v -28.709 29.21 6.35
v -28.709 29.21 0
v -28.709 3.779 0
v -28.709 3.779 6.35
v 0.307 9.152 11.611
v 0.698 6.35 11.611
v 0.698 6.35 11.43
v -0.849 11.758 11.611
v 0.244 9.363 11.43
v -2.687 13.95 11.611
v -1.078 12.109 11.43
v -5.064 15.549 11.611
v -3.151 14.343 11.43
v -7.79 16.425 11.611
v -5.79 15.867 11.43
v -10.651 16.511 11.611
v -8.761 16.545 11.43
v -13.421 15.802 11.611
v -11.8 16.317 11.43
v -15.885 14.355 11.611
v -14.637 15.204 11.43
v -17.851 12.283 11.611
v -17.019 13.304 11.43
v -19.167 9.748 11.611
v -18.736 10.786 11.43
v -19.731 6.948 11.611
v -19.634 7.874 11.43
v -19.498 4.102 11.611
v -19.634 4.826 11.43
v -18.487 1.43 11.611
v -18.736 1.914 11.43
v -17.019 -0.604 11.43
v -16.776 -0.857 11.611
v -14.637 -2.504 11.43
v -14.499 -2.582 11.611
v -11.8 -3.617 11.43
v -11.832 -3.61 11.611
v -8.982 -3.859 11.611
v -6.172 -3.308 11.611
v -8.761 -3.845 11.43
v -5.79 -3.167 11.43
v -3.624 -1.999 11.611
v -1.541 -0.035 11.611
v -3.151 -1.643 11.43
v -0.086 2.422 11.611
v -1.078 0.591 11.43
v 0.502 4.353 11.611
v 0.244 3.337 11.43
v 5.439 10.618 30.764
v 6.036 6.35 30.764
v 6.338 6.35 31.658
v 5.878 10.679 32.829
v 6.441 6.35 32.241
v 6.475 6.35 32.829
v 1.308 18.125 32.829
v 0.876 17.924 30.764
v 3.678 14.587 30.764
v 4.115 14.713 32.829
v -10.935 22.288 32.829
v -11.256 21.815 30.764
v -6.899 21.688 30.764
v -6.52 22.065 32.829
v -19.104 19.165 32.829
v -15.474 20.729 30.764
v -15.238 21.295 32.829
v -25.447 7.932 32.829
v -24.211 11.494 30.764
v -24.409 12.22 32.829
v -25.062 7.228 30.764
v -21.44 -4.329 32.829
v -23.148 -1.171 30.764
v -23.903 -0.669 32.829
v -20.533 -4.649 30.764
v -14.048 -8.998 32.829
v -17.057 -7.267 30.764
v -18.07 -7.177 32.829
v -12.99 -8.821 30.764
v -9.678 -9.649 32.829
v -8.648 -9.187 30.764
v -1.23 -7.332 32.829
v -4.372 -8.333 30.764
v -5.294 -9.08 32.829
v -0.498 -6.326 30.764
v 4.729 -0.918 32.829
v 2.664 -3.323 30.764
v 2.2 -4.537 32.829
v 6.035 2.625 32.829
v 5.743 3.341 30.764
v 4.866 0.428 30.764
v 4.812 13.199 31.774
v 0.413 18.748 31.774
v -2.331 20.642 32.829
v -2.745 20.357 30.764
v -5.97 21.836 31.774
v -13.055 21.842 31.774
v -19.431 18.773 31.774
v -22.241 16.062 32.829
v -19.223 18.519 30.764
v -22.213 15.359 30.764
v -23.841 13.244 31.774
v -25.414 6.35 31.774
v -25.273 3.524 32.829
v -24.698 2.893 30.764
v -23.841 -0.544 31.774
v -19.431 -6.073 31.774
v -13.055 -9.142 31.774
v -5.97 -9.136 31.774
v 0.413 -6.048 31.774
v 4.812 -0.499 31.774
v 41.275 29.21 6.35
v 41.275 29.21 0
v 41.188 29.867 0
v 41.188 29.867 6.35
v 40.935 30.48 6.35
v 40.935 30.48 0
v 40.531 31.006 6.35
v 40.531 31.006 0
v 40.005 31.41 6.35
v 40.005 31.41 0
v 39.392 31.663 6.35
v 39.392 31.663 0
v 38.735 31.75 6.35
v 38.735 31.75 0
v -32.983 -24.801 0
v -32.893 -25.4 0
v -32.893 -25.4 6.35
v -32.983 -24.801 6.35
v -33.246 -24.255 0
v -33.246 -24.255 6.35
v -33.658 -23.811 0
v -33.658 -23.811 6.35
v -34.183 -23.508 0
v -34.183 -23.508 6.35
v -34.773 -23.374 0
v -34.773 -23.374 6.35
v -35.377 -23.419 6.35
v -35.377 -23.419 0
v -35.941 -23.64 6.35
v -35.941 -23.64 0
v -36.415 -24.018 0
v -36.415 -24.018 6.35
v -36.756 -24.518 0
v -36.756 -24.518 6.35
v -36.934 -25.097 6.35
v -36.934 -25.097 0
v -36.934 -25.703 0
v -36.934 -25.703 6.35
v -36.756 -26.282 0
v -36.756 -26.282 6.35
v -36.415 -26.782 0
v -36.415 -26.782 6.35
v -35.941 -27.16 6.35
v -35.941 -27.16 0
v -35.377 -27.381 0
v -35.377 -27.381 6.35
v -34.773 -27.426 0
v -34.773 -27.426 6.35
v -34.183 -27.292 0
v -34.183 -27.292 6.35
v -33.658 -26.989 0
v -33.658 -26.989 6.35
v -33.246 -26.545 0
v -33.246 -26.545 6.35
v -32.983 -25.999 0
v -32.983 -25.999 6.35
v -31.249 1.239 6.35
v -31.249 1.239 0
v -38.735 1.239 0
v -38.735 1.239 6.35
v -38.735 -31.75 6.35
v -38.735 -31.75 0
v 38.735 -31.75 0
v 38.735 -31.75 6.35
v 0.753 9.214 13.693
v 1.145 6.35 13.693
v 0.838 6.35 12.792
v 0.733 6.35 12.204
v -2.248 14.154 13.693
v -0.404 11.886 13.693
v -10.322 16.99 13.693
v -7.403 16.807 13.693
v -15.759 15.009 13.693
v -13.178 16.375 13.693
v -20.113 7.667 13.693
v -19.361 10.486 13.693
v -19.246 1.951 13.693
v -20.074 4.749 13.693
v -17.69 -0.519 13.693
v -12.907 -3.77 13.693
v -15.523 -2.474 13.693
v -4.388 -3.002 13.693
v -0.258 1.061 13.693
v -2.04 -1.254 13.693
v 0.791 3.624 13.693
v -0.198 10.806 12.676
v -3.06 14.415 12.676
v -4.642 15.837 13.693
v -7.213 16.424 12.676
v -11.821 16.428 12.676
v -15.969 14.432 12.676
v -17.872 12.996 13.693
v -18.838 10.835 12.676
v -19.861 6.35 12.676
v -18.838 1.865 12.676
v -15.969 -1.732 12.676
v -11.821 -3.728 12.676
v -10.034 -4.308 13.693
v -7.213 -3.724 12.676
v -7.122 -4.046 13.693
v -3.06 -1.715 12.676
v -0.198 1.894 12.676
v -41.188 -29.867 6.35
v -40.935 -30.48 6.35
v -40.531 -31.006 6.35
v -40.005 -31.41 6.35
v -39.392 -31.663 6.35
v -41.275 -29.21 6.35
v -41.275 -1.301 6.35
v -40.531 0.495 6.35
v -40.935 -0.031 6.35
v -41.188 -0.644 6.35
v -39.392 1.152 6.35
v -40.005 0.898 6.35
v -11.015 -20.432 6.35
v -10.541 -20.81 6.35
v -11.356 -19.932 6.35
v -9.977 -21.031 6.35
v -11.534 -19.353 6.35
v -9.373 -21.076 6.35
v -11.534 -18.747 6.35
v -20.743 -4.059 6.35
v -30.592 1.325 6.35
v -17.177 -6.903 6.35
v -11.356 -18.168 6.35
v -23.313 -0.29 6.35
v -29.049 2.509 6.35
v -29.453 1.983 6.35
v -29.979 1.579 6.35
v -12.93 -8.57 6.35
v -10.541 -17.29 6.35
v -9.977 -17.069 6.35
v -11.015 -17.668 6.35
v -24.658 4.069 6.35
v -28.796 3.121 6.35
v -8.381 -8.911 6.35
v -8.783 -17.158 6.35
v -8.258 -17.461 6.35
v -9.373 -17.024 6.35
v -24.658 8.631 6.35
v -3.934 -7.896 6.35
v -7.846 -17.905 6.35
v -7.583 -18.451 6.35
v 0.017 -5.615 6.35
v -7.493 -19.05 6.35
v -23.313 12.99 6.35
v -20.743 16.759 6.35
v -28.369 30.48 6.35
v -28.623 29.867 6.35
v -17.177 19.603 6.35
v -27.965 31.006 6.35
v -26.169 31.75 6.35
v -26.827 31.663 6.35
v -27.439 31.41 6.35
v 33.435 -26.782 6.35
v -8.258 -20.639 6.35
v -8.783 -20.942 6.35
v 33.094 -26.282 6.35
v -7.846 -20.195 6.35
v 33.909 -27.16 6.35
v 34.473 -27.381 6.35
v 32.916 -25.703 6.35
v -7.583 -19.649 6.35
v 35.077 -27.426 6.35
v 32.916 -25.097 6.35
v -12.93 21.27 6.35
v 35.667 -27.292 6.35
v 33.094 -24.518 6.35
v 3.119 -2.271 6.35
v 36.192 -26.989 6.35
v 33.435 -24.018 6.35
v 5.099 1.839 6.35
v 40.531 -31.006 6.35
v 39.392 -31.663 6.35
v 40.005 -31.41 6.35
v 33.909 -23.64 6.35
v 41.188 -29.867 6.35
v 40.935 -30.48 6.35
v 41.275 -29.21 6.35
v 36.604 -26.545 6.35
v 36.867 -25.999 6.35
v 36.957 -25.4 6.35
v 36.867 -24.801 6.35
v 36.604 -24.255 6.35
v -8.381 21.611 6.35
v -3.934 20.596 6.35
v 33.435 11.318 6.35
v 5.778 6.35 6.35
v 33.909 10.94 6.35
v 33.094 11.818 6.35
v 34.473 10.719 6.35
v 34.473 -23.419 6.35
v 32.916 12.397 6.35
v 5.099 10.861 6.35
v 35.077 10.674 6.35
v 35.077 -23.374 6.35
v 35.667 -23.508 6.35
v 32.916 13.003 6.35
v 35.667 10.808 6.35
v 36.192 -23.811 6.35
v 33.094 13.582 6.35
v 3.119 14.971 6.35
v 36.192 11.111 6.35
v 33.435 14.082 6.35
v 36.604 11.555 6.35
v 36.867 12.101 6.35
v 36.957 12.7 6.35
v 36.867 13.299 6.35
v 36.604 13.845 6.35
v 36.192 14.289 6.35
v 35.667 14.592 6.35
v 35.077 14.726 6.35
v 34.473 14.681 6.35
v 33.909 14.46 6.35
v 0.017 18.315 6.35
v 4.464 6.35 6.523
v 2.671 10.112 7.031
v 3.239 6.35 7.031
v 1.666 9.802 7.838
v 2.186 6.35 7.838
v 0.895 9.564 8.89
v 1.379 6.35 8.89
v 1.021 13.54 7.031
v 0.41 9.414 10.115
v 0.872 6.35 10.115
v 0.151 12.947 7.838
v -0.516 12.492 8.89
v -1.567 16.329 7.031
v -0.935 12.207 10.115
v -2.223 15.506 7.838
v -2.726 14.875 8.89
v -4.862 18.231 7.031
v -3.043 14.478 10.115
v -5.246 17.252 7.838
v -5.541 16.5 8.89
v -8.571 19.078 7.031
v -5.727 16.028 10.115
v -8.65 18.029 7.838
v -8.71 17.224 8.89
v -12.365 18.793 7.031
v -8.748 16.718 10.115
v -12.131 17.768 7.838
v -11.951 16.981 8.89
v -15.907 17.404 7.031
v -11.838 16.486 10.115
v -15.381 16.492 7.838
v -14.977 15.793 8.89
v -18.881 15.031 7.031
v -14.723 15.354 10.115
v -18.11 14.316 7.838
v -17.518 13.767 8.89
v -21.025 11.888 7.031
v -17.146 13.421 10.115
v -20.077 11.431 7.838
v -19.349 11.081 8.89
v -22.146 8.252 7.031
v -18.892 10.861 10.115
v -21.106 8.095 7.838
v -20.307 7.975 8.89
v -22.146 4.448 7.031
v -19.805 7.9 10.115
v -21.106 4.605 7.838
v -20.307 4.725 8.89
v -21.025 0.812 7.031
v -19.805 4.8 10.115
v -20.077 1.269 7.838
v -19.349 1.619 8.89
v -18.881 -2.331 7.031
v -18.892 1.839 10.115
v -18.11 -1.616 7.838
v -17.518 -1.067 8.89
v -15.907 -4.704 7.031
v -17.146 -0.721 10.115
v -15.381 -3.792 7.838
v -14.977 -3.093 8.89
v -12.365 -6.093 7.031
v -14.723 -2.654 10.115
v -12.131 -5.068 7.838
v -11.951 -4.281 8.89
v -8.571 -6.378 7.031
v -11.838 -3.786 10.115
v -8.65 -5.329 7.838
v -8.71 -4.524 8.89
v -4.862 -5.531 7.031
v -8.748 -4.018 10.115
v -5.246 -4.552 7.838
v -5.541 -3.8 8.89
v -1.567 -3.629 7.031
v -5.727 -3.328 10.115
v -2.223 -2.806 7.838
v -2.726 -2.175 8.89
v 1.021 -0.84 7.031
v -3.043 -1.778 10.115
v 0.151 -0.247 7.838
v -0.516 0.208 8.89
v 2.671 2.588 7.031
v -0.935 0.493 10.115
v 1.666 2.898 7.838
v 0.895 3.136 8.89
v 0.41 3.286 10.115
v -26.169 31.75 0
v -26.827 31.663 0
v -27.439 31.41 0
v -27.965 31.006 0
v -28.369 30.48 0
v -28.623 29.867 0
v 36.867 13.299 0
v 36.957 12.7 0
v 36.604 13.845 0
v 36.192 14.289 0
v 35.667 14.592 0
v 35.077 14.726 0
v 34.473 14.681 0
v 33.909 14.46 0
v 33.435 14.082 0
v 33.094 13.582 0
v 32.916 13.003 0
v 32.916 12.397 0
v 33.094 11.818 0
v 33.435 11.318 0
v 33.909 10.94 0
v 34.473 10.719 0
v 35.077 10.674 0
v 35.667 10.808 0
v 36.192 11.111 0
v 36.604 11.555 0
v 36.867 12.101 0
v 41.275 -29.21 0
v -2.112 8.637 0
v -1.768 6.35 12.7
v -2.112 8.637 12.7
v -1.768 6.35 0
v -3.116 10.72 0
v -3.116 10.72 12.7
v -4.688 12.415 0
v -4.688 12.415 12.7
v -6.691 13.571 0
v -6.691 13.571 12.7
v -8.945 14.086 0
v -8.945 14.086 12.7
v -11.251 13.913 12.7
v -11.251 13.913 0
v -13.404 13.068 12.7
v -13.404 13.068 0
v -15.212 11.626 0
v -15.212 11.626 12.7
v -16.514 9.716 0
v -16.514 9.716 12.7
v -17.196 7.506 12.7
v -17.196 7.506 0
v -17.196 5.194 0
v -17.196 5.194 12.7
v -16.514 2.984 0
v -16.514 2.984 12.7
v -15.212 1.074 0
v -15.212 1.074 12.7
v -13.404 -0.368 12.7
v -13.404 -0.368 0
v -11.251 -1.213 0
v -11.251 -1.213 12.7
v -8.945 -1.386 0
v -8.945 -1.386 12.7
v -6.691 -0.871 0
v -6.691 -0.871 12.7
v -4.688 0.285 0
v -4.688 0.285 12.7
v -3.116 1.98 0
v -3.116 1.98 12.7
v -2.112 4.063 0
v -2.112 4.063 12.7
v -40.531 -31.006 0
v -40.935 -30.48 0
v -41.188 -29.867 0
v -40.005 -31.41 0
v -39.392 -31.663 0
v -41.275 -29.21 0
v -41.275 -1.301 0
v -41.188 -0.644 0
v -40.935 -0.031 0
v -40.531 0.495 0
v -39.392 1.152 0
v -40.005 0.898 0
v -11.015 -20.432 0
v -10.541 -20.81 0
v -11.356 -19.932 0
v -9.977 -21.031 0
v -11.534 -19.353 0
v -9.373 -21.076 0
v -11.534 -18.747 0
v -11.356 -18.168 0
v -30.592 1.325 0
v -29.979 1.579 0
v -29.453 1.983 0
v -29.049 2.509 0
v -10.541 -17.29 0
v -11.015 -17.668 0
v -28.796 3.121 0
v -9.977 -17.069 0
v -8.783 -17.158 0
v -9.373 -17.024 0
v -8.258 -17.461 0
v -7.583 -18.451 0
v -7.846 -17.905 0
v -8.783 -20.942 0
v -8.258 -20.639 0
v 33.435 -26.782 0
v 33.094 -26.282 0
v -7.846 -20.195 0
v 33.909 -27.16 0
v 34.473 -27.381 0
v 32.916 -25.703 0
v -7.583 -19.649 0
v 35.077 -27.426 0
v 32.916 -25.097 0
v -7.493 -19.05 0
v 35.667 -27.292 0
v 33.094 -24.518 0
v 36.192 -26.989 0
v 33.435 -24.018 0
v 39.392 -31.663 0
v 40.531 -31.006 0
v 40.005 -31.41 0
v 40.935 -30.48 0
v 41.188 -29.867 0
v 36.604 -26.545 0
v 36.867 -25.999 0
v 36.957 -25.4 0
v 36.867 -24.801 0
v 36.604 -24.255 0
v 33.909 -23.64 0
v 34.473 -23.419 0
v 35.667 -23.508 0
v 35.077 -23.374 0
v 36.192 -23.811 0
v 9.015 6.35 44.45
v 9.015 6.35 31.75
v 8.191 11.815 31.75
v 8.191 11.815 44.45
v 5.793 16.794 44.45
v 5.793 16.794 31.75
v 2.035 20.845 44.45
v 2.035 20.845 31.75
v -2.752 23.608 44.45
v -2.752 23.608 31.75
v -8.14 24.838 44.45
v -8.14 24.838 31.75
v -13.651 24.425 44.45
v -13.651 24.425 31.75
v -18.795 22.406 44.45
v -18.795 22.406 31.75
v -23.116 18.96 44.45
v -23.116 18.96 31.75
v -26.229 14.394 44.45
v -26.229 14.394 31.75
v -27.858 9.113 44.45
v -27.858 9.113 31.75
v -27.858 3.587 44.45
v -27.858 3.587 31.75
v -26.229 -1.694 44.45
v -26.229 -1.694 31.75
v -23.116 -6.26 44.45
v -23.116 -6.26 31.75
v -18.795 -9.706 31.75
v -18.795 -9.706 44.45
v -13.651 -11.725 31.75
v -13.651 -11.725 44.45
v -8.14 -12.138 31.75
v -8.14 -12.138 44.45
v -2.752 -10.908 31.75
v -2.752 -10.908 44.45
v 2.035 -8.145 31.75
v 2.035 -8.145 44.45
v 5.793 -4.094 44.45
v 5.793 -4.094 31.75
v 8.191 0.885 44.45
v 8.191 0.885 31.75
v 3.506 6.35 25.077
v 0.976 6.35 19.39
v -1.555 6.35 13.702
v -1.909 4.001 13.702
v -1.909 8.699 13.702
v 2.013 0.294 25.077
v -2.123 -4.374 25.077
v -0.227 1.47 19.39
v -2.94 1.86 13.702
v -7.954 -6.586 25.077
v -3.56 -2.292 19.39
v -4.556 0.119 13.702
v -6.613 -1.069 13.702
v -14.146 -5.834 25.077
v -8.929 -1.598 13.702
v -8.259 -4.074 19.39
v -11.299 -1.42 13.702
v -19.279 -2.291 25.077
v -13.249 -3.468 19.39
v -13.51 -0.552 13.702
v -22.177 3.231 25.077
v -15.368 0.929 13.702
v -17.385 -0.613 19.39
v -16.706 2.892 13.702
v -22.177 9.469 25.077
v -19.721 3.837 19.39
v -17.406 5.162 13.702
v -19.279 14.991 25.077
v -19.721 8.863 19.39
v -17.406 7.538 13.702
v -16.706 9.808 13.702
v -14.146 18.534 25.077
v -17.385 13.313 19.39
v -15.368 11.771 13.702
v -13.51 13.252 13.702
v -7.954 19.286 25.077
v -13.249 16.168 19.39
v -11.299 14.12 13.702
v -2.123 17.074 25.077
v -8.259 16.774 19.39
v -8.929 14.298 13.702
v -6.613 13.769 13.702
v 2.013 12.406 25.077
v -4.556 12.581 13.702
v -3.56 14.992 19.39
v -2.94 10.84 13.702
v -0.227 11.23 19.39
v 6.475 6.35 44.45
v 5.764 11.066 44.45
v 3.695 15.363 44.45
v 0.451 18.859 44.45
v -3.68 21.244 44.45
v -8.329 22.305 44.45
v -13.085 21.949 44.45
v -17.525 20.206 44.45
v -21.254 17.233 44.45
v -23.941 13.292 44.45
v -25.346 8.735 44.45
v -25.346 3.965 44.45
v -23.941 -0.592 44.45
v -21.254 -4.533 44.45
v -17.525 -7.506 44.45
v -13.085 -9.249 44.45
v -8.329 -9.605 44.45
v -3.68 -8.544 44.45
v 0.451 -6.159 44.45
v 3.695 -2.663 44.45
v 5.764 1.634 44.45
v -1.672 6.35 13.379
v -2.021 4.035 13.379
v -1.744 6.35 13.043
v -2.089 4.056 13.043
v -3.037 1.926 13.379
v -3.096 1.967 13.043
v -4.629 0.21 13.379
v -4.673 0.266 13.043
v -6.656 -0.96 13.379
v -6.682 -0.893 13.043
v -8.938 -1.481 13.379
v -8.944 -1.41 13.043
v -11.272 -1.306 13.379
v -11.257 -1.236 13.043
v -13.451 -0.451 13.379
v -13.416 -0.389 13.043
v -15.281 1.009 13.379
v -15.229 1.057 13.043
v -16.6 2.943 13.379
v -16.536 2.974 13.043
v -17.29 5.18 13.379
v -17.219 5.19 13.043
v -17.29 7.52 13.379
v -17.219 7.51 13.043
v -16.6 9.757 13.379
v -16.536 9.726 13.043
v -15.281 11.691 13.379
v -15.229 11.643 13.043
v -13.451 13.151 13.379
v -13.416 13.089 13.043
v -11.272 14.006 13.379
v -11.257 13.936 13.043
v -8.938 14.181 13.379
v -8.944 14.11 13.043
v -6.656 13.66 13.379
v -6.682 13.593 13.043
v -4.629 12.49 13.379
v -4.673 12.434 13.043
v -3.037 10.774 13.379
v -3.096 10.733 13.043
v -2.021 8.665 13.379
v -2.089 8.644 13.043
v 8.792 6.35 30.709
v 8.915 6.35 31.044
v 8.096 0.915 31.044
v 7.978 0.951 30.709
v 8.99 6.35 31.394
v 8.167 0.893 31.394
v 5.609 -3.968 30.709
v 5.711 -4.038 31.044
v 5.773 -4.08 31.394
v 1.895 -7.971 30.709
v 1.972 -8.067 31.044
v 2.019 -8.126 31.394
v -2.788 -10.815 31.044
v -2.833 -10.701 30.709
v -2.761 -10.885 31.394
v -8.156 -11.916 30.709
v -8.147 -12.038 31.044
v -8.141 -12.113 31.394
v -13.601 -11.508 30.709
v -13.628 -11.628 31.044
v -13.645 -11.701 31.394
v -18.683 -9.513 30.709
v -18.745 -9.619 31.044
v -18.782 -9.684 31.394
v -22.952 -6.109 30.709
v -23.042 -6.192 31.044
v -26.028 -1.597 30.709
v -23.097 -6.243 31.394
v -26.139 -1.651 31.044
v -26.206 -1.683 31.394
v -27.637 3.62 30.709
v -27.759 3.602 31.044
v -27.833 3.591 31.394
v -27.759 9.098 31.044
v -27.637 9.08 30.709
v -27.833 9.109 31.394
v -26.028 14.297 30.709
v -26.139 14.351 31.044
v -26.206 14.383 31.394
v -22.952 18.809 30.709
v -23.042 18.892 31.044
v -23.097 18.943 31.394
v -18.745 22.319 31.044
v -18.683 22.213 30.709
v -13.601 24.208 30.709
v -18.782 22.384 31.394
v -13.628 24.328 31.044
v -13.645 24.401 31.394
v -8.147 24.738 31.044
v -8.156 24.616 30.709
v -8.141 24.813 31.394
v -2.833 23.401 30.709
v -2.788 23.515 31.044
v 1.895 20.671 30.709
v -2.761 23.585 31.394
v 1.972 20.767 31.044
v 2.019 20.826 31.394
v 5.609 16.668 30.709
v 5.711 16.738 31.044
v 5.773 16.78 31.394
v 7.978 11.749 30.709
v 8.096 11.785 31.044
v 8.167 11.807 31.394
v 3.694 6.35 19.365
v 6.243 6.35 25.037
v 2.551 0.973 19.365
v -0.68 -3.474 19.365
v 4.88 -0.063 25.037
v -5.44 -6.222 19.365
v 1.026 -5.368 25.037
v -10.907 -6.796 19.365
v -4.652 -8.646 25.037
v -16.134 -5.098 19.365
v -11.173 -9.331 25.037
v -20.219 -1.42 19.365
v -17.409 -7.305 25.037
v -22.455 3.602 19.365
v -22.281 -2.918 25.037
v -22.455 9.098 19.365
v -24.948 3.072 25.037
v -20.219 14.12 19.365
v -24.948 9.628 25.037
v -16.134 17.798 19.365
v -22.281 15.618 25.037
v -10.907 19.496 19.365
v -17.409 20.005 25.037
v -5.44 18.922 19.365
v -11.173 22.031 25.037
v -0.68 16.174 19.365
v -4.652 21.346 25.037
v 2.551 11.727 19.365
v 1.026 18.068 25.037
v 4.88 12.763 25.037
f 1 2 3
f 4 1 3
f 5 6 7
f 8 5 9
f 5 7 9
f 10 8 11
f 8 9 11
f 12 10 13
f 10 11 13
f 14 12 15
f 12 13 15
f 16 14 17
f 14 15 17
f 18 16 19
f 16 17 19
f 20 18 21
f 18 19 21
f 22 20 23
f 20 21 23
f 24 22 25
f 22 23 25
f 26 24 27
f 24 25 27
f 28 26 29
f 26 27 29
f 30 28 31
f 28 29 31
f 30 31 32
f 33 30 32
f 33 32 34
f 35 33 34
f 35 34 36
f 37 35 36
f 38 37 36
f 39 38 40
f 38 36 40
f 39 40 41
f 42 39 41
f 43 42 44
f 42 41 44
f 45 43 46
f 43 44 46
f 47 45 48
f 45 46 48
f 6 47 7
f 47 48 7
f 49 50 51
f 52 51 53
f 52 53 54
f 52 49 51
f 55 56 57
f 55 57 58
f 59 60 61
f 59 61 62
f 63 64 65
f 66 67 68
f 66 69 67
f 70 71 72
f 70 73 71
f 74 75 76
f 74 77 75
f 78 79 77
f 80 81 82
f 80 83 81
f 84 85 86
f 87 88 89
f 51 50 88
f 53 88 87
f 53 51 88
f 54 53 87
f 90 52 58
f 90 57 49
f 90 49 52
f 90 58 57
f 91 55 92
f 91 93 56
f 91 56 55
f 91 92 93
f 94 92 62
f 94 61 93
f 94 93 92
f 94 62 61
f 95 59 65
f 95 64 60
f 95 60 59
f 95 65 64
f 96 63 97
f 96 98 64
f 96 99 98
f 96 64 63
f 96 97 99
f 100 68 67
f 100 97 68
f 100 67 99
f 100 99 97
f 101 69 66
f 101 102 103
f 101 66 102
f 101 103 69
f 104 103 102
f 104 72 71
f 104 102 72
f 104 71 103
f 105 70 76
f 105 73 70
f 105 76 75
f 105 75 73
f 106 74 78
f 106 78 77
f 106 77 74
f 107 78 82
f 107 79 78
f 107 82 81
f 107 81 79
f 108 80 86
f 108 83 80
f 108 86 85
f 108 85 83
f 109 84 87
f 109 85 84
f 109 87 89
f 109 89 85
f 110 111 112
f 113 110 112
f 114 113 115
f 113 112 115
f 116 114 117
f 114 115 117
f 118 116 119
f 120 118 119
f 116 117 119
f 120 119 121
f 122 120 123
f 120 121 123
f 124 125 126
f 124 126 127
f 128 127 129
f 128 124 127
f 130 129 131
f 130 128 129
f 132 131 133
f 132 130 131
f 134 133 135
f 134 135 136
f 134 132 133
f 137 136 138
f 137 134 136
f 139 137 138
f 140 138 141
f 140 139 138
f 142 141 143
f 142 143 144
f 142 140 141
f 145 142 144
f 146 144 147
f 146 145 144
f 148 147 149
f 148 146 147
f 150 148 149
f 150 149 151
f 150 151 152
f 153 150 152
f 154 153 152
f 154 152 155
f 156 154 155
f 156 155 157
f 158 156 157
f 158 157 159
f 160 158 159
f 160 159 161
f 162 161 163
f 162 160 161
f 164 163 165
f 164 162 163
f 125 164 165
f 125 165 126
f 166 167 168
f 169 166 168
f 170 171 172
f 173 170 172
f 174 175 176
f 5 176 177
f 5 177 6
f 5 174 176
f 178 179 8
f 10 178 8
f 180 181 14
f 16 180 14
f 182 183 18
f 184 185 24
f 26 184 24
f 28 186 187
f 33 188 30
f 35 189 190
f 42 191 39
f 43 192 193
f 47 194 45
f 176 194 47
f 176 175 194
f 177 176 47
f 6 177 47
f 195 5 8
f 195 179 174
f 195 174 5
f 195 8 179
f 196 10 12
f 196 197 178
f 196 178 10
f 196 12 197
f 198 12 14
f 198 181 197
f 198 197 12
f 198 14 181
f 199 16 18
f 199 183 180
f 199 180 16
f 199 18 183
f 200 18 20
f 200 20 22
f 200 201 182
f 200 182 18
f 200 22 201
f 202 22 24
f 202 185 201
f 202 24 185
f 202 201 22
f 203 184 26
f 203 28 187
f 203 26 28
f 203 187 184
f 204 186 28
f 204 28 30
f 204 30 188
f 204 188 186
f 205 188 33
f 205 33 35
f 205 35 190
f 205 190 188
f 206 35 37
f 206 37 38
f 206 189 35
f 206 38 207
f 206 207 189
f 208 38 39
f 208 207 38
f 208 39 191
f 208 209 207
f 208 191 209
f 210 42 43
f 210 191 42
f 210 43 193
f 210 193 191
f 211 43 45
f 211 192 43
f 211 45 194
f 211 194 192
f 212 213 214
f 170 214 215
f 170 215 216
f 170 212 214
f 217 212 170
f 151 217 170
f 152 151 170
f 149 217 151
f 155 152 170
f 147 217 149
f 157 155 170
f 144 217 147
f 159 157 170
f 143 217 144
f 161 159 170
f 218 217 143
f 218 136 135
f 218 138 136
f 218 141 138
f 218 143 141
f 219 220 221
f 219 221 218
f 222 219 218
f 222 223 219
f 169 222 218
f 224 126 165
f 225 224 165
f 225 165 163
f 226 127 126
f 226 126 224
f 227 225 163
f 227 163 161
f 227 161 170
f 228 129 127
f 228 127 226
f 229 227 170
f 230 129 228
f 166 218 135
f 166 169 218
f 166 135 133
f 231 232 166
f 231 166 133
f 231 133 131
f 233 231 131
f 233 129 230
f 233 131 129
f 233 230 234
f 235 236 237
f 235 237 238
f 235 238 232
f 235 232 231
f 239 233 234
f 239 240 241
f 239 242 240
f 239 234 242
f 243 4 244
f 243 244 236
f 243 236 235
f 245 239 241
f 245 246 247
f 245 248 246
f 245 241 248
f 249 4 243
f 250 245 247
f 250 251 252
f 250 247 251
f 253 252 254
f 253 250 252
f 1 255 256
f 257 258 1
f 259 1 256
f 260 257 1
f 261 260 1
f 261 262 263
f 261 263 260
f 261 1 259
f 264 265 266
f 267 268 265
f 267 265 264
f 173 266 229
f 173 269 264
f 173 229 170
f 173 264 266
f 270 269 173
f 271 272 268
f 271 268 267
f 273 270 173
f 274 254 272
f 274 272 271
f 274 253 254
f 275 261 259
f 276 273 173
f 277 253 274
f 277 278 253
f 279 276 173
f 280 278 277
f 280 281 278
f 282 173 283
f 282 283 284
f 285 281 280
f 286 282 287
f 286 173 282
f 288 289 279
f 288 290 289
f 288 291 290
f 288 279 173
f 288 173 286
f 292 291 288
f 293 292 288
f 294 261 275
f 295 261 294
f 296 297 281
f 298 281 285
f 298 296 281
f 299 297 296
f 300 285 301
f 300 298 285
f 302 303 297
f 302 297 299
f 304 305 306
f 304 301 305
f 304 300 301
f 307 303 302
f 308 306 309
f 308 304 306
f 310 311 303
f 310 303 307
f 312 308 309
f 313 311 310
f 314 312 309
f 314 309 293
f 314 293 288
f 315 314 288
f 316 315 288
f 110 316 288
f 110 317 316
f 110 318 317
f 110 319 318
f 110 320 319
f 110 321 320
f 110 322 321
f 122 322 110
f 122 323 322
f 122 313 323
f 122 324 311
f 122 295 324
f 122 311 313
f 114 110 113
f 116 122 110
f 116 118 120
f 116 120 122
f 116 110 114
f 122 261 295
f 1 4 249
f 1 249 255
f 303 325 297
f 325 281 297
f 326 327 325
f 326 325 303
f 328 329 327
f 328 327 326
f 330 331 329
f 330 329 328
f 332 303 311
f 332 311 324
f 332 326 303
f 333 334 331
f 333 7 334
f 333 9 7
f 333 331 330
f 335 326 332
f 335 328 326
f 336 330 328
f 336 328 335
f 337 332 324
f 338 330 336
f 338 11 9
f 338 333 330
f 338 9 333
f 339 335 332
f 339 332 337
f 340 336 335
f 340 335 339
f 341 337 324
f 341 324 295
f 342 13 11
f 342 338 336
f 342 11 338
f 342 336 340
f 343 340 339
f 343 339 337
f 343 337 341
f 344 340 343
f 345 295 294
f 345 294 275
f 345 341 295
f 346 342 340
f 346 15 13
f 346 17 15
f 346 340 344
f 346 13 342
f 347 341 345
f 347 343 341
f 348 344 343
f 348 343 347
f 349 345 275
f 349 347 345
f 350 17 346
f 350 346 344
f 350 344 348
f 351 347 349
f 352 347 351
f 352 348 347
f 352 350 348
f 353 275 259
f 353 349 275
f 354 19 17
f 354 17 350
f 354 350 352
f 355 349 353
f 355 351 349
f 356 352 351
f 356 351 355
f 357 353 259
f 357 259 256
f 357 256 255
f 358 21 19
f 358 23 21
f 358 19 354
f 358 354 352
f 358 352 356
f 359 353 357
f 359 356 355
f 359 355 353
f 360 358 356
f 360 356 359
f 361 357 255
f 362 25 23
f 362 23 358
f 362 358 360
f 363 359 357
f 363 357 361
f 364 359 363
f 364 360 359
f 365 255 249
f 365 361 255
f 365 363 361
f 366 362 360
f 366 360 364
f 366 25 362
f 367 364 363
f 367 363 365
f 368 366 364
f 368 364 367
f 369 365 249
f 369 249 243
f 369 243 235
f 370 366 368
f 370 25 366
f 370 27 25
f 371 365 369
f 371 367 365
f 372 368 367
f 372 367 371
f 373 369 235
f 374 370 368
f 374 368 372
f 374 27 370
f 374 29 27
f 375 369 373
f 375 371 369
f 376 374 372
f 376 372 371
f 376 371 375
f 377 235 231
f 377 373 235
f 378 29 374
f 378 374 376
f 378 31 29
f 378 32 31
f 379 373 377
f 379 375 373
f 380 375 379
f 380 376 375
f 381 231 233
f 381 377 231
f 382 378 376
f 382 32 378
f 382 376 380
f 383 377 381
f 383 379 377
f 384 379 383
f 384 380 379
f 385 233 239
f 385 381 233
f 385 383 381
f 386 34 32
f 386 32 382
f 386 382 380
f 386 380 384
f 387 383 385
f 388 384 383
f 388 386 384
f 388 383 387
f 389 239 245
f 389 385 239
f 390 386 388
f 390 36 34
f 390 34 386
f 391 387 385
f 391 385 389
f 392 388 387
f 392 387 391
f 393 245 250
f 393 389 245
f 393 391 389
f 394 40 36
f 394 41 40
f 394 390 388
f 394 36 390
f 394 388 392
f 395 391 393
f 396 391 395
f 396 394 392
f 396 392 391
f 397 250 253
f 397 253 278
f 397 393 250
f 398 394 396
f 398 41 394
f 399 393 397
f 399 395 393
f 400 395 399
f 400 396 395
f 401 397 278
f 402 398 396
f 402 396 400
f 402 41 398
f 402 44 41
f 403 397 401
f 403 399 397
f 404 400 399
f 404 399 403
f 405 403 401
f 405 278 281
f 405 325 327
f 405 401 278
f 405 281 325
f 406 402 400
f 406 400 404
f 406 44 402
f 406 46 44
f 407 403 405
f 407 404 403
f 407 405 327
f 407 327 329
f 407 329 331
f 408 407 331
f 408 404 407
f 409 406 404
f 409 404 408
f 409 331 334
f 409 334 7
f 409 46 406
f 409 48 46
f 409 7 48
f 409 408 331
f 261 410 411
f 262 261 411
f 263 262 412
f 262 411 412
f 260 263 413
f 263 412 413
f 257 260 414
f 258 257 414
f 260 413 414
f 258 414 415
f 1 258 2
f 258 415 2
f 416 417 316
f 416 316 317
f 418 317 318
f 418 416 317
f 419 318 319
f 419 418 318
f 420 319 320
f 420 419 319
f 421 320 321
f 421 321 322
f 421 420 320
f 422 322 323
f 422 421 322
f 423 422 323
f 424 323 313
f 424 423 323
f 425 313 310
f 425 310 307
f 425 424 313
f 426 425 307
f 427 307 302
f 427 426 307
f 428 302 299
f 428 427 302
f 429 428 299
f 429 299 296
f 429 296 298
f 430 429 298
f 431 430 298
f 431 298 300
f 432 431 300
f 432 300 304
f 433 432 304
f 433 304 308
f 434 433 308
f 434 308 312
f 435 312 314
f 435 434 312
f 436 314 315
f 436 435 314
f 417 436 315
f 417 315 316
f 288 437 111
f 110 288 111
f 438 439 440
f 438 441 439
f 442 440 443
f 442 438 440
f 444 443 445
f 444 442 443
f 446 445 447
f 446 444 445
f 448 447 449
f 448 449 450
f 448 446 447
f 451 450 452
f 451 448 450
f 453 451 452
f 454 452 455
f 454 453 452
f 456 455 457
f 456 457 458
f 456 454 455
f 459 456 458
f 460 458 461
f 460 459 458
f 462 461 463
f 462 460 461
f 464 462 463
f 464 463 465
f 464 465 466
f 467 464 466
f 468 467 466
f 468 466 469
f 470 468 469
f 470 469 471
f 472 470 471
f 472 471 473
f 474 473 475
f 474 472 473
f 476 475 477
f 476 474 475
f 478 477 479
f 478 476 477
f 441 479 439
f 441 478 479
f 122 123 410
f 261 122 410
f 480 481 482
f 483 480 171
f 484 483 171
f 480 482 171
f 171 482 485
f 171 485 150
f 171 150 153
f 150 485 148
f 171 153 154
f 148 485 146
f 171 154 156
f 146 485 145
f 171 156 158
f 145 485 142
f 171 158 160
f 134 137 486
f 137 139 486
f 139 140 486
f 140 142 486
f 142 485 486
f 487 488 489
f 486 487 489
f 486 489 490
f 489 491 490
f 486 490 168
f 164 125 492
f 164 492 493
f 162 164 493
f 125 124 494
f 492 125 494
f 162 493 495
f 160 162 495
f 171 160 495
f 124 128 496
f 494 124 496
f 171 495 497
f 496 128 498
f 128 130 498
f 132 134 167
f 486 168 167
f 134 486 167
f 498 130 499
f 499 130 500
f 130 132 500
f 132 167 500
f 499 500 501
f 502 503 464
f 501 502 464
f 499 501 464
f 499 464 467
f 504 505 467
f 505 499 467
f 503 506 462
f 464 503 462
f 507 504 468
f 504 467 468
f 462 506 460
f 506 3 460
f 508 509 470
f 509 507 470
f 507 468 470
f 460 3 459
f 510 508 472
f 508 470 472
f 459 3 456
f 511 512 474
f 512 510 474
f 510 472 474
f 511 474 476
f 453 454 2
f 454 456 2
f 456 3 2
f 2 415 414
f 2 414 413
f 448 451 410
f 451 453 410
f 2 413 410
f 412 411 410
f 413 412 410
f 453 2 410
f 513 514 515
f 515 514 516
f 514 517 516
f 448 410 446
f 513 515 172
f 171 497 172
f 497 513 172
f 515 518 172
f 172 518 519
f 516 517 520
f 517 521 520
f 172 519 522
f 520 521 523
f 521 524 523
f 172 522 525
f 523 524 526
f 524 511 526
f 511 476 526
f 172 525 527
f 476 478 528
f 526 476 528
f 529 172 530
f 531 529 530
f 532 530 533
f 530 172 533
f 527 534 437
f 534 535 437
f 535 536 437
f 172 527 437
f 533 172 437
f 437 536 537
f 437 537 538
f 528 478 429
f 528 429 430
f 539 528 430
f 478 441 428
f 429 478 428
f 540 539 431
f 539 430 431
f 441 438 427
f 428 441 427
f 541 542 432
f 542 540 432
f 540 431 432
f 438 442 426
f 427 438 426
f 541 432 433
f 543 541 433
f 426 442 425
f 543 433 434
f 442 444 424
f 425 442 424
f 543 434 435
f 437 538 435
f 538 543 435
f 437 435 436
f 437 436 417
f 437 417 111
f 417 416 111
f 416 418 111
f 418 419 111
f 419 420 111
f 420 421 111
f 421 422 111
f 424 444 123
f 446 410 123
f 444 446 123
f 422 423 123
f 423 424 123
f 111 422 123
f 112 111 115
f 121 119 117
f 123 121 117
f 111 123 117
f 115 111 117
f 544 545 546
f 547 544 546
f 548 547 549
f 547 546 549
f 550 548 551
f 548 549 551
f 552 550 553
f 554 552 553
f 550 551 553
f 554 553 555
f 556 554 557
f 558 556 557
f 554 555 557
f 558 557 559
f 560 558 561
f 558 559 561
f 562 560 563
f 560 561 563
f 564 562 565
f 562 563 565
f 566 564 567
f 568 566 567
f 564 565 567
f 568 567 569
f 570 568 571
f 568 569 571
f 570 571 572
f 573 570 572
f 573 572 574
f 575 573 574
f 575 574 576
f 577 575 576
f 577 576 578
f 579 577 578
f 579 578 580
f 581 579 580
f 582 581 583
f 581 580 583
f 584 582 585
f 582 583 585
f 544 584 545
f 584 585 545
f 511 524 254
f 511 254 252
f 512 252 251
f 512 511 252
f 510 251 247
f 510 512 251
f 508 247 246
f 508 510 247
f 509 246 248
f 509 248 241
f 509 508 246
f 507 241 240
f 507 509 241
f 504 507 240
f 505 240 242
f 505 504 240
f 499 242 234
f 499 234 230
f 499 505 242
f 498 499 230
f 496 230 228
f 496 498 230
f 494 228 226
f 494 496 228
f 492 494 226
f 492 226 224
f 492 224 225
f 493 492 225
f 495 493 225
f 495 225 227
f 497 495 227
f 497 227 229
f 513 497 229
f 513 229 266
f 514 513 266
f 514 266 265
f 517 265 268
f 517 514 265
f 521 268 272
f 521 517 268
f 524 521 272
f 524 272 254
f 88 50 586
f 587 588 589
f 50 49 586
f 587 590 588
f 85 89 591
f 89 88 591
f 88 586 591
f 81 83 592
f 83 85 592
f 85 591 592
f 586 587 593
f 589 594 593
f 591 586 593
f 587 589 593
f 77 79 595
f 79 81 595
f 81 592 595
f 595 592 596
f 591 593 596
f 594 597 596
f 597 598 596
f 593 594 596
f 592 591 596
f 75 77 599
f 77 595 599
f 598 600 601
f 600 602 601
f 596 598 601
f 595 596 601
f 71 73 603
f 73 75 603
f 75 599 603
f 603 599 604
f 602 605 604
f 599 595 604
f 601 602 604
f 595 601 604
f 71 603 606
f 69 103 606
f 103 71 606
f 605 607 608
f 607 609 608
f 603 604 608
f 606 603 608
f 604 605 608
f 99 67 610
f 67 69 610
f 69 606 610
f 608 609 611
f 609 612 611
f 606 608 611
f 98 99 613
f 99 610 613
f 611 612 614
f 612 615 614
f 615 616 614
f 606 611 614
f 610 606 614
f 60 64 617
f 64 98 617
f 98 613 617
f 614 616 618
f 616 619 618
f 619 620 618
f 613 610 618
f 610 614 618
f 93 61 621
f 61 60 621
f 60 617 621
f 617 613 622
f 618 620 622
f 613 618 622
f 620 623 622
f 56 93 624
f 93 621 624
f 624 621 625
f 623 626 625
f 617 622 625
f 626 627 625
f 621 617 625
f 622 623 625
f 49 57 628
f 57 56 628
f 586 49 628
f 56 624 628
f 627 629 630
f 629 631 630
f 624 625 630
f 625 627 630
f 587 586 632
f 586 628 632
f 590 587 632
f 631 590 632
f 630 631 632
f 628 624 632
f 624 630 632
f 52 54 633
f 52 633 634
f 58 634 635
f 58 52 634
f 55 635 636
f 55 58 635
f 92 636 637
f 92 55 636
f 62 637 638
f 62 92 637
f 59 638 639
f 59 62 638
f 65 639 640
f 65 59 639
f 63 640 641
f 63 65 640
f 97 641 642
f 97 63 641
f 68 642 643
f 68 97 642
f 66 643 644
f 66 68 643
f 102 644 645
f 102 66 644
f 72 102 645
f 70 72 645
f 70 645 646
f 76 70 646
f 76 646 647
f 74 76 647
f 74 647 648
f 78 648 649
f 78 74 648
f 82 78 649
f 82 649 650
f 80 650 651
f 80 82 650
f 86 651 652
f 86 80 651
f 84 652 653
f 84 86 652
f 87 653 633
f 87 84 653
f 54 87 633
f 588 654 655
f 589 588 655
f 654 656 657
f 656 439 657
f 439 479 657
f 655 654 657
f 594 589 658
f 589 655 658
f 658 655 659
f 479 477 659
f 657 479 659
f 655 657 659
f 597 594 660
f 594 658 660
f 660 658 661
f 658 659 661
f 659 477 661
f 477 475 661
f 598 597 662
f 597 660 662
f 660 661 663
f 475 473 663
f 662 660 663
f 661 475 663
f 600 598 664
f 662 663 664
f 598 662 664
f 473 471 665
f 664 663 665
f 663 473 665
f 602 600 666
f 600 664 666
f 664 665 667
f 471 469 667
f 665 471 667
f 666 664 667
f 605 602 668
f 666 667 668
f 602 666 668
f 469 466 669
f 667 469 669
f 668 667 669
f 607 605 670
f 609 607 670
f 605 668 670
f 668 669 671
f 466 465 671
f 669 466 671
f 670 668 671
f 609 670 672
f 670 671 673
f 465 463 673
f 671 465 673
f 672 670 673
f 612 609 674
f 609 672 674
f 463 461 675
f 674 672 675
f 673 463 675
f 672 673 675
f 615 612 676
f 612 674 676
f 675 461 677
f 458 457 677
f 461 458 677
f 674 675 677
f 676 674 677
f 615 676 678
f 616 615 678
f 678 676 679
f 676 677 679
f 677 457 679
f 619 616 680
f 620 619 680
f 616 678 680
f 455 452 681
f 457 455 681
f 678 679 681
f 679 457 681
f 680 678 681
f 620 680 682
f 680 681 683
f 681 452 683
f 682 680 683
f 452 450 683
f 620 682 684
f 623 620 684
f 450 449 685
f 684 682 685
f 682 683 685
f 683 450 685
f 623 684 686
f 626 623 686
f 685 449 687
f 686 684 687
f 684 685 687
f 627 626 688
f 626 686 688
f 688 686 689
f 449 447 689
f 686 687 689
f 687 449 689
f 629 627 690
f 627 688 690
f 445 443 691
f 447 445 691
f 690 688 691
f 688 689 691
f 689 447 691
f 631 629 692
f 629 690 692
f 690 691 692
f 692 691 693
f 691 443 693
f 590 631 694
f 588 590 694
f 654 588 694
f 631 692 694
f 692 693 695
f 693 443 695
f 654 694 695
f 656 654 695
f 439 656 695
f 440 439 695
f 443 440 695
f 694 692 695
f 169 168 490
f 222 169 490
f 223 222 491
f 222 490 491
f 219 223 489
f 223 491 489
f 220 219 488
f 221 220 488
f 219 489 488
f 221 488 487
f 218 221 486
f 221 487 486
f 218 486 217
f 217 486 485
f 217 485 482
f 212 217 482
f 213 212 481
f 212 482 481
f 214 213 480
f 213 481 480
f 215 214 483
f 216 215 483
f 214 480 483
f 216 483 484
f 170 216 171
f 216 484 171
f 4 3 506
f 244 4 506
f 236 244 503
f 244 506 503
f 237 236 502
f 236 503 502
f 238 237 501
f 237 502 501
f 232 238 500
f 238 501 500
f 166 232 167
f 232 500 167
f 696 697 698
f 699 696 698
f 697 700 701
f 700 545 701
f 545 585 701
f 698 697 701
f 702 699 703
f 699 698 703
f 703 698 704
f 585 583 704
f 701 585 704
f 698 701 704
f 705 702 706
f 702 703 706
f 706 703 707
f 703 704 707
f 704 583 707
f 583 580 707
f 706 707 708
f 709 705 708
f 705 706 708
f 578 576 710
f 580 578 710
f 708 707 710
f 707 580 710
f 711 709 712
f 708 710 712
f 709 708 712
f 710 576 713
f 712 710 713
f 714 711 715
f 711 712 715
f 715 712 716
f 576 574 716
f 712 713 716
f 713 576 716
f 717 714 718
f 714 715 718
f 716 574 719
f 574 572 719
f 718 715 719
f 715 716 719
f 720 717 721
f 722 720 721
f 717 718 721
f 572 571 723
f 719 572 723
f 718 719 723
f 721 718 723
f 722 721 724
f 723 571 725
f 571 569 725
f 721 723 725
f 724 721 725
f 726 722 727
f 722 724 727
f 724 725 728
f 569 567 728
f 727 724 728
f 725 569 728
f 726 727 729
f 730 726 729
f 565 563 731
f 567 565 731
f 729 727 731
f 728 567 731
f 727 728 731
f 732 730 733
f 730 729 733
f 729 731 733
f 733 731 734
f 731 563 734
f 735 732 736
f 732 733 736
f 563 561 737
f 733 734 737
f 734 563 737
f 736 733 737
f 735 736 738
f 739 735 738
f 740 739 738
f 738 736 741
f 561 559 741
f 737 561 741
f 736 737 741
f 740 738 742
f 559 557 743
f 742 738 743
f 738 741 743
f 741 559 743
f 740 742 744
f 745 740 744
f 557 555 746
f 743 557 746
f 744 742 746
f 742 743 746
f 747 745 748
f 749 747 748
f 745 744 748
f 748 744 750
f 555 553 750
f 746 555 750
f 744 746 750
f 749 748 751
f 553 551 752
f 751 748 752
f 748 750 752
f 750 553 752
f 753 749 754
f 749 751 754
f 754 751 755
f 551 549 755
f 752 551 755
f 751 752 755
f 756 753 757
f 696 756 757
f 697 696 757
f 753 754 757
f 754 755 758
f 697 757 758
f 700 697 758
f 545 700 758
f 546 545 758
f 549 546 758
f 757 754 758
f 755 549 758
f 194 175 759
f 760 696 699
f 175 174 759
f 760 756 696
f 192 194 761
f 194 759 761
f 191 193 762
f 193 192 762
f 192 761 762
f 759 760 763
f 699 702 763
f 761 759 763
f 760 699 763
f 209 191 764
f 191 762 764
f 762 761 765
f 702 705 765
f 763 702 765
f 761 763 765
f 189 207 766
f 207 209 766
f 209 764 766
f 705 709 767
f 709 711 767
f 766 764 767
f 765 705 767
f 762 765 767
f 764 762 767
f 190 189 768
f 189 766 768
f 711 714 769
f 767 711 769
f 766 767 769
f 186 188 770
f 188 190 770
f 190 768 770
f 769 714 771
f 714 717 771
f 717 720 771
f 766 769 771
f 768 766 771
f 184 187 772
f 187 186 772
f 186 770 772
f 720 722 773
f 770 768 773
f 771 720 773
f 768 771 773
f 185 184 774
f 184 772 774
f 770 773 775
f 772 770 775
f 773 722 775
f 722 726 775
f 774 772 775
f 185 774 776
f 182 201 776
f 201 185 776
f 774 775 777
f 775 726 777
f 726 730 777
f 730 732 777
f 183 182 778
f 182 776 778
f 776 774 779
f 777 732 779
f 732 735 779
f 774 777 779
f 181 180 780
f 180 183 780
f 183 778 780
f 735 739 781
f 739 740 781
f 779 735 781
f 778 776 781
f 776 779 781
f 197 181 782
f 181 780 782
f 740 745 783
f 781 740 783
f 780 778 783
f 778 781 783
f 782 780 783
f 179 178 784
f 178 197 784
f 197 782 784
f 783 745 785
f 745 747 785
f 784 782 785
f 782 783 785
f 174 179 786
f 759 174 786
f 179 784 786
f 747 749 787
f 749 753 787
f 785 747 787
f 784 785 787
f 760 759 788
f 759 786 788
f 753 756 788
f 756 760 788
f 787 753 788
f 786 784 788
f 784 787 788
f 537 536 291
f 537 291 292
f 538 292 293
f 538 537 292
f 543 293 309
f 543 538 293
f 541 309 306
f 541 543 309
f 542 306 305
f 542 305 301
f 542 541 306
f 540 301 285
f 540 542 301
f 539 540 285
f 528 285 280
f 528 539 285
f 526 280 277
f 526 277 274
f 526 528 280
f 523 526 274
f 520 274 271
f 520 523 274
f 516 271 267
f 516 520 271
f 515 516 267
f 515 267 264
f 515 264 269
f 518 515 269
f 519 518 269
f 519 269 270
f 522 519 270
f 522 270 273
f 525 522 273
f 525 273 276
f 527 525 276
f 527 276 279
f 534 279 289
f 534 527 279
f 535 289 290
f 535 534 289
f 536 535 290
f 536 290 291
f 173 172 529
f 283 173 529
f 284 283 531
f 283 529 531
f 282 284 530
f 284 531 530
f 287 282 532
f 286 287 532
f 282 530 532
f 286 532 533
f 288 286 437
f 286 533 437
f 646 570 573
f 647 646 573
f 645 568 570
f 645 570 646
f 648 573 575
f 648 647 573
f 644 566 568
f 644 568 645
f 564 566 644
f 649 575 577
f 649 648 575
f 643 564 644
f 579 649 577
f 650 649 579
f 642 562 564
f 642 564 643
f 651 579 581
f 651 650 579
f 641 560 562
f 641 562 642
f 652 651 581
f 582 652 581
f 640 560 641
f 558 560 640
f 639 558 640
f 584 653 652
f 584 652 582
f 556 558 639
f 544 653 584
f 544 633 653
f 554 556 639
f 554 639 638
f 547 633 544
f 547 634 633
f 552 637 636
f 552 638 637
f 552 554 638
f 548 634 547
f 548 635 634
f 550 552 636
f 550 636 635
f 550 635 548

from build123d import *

# Parameters (mm, degrees)
F0_R     = 2.032
F0_R_2   = 7.7573632
F1_DEPTH = 6.35
F3_R     = 10.2235
F3_R_2   = 7.7573632
F4_DEPTH = 6.35
F6_R     = 18.5400007717
F6_R_2   = 16
F7_DEPTH = 12.7
F13_R    = 5.08


with BuildPart() as f1:
    # F0 (on Top) → F1 (new body)
    with BuildSketch(Plane.XY):
        with BuildLine():
            Line((-41.275, -1.3013436), (-41.275, -29.21))
            ThreePointArc((-41.275, -29.21), (-40.5310512242, -31.0060512242), (-38.735, -31.75))
            Line((-38.735, -31.75), (38.735, -31.75))
            ThreePointArc((38.735, -31.75), (40.5310512242, -31.0060512242), (41.275, -29.21))
            Line((41.275, -29.21), (41.275, 29.21))
            ThreePointArc((41.275, 29.21), (40.5310512242, 31.0060512242), (38.735, 31.75))
            Line((38.735, 31.75), (-26.1691374, 31.75))
            ThreePointArc((-26.1691374, 31.75), (-27.9651886242, 31.0060512242), (-28.7091374, 29.21))
            Line((-28.7091374, 29.21), (-28.7091374, 3.7786564))
            ThreePointArc((-28.7091374, 3.7786564), (-29.4530861758, 1.9826051758), (-31.2491374, 1.2386564))
            Line((-31.2491374, 1.2386564), (-38.735, 1.2386564))
            ThreePointArc((-38.735, 1.2386564), (-40.5310512242, 0.4947076242), (-41.275, -1.3013436))
        make_face()
        with Locations((-34.925, -25.4)):
            Circle(F0_R, mode=Mode.SUBTRACT)
        with Locations((-9.525, -19.05)):
            Circle(F0_R, mode=Mode.SUBTRACT)
        with Locations((34.925, -25.4)):
            Circle(F0_R, mode=Mode.SUBTRACT)
        with Locations((-9.525, 6.35)):
            Circle(F0_R_2, mode=Mode.SUBTRACT)
        with Locations((34.925, 12.7)):
            Circle(F0_R, mode=Mode.SUBTRACT)
    extrude(amount=F1_DEPTH)

    # F3 (on face) → F4 (join)
    with BuildSketch(Plane.XY.offset(6.35)):
        with Locations((-9.525, 6.35)):
            Circle(F3_R)
        with Locations((-9.525, 6.35)):
            Circle(F3_R_2, mode=Mode.SUBTRACT)
    extrude(amount=F4_DEPTH)



with BuildPart() as f7:
    # F6 (on offset) → F7 (new body)
    with BuildSketch(Plane.XY.offset(31.75)):
        with Locations((-9.525, 6.35)):
            Circle(F6_R)
        with Locations((-9.525, 6.35)):
            Circle(F6_R_2, mode=Mode.SUBTRACT)
    extrude(amount=F7_DEPTH)


with BuildPart() as f1_1:
    add(f1.part)

    add(f7.part)  # F12 merges F7
    # F11 (on 3pt) → F12 (revolve)
    with BuildSketch(Plane.XZ.offset(-6.35)):
        with BuildLine():
            Line((9.0150007717, 31.75), (6.475, 31.75))
            Line((6.475, 31.75), (-1.5546870253, 13.7024863815))
            ThreePointArc((-1.5546870253, 13.7024863815), (-1.7138119778, 13.2124272026), (-1.7676368, 12.7))
            Line((-1.7676368, 12.7), (0.6985, 12.7))
            Line((0.6985, 12.7), (8.7917948258, 30.7088152634))
            ThreePointArc((8.7917948258, 30.7088152634), (8.9585724839, 31.2175794543), (9.0150007717, 31.75))
        make_face()
    revolve(axis=Axis((-9.525, 6.35, 28.575), (0, 0, -1)))

    # F13
    f13_edges = [f1_1.edges().sort_by_distance(p)[0] for p in [
        (-19.7485, 6.35, 12.7),
        (-19.7485, 6.35, 6.35),
        (-25.525, 6.35, 31.75),
    ]]
    fillet(f13_edges, radius=F13_R)


solid = f1_1.part
